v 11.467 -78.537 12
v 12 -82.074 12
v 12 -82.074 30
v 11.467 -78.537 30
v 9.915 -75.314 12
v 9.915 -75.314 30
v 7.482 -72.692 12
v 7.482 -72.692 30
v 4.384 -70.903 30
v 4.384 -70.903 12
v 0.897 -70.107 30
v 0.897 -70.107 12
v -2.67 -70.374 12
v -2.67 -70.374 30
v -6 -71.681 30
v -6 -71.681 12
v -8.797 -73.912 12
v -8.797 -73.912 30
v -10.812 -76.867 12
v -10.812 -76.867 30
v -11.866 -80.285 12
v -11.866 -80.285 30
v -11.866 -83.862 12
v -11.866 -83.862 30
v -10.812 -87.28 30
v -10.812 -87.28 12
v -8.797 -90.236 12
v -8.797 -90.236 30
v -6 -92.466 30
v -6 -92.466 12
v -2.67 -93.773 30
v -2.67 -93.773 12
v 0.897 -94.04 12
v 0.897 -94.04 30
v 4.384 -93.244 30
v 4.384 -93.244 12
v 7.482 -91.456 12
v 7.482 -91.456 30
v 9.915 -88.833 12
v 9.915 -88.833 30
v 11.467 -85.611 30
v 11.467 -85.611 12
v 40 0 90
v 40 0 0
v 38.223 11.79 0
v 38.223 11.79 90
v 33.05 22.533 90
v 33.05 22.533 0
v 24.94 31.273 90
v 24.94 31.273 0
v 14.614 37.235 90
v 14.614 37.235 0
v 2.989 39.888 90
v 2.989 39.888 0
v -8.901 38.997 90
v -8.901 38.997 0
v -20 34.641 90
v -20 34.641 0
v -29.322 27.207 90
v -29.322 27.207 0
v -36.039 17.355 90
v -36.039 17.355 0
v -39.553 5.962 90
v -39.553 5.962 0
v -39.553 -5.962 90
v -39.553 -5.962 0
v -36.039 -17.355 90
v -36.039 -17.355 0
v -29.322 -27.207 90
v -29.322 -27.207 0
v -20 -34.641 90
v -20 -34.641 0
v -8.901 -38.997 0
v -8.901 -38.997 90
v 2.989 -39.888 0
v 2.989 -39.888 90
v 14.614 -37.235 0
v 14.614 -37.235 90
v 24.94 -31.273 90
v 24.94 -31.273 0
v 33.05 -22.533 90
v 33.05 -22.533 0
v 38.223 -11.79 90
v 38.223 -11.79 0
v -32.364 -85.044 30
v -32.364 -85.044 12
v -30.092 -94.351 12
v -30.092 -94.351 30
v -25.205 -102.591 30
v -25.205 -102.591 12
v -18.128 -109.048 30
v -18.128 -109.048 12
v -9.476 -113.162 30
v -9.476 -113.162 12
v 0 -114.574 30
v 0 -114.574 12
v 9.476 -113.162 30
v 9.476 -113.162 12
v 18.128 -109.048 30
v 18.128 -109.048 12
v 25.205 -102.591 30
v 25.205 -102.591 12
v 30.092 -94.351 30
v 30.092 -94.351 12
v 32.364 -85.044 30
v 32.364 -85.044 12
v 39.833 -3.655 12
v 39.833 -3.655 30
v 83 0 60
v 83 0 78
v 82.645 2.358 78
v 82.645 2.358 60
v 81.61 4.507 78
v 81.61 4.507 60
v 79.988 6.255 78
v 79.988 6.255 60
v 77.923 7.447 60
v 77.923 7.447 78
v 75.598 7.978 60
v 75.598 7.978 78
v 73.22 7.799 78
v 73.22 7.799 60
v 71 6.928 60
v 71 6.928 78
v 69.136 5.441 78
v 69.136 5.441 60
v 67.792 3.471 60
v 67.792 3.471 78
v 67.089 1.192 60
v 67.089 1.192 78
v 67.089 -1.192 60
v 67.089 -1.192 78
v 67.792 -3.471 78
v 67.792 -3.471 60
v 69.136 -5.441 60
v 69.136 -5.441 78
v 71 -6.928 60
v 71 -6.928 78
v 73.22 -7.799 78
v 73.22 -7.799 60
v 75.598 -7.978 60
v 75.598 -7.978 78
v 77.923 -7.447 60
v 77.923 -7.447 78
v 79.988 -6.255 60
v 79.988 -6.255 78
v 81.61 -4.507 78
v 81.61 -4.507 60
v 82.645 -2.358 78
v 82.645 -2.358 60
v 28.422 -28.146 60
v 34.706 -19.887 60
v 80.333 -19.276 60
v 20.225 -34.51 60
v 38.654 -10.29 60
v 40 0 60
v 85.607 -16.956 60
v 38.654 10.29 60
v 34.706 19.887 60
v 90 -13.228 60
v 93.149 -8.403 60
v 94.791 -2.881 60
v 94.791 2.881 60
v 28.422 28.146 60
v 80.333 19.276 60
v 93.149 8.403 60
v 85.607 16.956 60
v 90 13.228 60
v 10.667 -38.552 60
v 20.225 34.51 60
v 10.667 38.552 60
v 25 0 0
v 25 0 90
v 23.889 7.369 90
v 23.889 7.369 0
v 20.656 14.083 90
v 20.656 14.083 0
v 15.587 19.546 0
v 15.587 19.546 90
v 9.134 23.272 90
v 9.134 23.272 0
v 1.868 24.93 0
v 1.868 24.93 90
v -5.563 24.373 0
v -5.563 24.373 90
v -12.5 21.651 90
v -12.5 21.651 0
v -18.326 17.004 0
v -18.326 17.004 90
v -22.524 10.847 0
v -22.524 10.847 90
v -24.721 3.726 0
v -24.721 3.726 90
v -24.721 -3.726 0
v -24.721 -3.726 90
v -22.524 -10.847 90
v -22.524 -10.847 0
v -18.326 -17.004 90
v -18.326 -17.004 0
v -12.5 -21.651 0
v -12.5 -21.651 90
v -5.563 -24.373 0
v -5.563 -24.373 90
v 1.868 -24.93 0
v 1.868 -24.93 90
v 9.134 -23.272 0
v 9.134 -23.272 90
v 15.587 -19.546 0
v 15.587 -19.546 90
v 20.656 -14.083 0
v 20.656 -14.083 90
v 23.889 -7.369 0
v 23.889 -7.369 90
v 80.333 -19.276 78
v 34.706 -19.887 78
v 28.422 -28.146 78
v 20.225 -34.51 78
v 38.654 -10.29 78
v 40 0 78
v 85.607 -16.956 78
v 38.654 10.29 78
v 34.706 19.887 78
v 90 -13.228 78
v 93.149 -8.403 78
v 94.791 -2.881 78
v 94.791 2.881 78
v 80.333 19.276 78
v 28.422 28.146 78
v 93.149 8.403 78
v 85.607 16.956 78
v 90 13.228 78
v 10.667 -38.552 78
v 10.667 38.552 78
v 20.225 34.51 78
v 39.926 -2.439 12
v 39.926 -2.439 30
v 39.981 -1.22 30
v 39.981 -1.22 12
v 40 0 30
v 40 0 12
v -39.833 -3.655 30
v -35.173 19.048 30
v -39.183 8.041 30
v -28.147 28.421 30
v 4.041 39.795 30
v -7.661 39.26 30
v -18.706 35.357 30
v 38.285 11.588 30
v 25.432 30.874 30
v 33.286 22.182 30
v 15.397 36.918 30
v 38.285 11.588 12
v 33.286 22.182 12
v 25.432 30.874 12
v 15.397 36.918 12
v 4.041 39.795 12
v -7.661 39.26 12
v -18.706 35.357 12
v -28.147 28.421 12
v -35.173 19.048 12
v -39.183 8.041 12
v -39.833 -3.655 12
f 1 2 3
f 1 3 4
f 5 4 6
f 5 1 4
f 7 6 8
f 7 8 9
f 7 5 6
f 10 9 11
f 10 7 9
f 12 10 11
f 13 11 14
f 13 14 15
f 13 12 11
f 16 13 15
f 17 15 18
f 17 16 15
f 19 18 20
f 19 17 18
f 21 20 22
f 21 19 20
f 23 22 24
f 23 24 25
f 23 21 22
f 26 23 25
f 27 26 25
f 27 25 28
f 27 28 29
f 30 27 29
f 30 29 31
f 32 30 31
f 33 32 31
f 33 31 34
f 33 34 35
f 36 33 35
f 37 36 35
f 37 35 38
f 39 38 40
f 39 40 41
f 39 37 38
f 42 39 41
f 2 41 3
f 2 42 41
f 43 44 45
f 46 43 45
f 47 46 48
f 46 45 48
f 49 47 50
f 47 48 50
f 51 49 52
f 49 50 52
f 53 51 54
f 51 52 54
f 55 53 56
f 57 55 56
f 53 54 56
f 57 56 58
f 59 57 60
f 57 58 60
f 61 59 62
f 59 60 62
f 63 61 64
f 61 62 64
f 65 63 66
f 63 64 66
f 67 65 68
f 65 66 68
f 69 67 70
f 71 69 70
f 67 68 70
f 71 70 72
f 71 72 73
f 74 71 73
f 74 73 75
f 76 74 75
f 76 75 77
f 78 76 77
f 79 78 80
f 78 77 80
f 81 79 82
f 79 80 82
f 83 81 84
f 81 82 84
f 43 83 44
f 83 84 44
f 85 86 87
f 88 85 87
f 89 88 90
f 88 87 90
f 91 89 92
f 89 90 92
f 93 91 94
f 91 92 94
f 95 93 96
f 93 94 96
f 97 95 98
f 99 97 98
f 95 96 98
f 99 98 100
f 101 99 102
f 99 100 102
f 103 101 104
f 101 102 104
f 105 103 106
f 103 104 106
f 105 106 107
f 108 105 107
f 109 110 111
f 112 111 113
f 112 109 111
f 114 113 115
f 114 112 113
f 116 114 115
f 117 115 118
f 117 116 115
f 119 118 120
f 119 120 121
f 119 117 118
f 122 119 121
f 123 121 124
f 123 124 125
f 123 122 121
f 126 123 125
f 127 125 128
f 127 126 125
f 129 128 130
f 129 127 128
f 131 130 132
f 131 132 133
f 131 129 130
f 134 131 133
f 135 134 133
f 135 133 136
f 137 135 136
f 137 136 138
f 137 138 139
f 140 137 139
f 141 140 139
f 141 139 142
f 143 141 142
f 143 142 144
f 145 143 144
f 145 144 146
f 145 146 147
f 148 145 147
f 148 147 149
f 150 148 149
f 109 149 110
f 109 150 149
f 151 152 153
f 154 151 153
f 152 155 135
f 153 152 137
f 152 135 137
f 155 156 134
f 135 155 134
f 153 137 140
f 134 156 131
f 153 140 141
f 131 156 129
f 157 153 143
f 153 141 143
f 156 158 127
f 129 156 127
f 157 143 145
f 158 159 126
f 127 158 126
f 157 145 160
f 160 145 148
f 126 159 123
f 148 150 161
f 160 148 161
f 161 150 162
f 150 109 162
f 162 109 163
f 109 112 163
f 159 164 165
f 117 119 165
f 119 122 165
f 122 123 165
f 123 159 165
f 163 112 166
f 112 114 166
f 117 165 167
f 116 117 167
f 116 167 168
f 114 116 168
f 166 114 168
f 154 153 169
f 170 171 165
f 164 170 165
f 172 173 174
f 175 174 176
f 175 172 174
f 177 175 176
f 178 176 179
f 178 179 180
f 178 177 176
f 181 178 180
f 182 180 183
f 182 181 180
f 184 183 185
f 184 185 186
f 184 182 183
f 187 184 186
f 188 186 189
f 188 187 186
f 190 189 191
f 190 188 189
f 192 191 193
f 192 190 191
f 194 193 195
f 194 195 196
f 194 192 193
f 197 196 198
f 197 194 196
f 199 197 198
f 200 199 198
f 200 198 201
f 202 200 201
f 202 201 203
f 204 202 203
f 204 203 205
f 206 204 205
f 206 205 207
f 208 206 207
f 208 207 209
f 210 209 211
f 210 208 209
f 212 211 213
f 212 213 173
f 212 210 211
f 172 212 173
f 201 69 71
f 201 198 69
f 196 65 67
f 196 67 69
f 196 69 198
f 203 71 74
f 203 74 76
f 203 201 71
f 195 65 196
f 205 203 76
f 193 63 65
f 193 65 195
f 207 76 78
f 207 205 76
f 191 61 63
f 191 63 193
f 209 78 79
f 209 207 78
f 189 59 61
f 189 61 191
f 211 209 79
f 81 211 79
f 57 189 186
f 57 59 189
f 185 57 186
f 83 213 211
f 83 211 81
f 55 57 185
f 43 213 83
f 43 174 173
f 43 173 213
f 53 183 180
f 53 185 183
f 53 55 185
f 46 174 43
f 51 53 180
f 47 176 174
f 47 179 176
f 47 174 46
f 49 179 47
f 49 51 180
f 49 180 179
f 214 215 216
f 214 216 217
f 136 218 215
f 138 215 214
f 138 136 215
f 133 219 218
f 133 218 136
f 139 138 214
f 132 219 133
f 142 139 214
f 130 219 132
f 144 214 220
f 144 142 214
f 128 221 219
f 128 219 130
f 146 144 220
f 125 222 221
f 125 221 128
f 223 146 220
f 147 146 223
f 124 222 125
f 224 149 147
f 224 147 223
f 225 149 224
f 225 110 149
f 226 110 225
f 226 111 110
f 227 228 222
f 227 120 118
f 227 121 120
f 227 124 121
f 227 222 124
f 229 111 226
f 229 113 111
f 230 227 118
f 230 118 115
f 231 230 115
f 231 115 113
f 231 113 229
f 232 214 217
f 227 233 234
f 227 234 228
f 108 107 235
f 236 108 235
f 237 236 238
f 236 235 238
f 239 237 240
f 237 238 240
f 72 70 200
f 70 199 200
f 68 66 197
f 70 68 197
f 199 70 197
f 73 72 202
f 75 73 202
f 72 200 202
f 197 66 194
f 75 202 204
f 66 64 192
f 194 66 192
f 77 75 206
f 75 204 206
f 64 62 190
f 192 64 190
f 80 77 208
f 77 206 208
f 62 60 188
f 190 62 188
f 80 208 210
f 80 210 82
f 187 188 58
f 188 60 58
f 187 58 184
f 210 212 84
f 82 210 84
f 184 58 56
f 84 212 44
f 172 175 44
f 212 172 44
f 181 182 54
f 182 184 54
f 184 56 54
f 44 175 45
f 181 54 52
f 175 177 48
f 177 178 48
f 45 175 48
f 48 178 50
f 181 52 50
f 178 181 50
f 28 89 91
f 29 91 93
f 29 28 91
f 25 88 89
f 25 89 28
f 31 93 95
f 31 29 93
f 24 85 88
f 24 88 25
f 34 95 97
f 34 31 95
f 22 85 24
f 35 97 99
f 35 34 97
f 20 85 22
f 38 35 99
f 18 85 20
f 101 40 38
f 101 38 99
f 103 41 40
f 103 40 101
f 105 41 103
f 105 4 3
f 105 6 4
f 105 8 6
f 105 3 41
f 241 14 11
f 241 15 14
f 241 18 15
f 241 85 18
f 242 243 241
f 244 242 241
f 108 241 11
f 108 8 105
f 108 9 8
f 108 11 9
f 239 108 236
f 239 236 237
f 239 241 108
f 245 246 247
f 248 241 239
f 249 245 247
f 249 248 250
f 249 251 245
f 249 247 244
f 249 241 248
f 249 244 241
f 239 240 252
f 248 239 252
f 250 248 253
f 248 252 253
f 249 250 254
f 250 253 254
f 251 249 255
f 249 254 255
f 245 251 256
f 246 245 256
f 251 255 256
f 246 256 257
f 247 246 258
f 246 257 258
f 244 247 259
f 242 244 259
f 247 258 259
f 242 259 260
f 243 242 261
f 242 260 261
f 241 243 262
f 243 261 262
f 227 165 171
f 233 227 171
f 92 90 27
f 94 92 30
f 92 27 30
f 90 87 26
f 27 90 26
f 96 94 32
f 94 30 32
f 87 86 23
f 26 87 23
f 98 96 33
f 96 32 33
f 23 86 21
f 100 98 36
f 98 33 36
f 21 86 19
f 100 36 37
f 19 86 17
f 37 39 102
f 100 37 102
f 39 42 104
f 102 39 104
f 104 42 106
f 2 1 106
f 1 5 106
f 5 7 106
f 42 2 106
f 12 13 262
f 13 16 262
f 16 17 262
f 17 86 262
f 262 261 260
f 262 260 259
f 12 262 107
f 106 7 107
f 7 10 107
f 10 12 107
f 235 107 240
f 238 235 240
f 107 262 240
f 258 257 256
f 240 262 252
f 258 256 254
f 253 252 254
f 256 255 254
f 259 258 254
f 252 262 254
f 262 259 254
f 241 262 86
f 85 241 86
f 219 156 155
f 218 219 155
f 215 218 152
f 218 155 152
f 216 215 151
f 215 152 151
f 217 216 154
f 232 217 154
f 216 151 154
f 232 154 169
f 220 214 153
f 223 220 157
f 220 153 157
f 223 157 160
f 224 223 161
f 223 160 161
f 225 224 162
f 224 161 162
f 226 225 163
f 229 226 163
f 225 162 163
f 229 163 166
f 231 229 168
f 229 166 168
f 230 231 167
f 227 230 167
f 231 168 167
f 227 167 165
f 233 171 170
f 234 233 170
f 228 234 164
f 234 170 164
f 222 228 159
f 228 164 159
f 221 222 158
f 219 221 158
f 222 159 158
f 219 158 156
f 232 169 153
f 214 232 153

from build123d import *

# Parameters (mm, degrees)
F0_R     = 40
F0_R_2   = 25
F1_DEPTH = 90
F2_R     = 8
F3_DEPTH = 18
F5_R     = 12
F6_DEPTH = 18


with BuildPart() as f1:
    # F0 (on Top) → F1 (new body)
    with BuildSketch(Plane.XY):
        Circle(F0_R)
        Circle(F0_R_2, mode=Mode.SUBTRACT)
    extrude(amount=F1_DEPTH)


with BuildPart() as f3:
    # F2 (on Top) → F3 (new body)
    with BuildSketch(Plane.XY):
        with BuildLine():
            Line((10.666667, -38.551553), (80.333333, -19.275776))
            ThreePointArc((80.333333, -19.275776), (95, 0), (80.333333, 19.275776))
            Line((80.333333, 19.275776), (10.666667, 38.551553))
            ThreePointArc((10.666667, 38.551553), (31.832897, 24.221203), (40, 0))
            ThreePointArc((40, 0), (31.832897, -24.221203), (10.666667, -38.551553))
        make_face()
        with Locations((75, 0)):
            Circle(F2_R, mode=Mode.SUBTRACT)
    extrude(amount=F3_DEPTH)


with BuildPart() as f3_1:
    # F4: moved
    add(f3.part.moved(Location((0, 0, 60))))


with BuildPart() as f6:
    # F5 (on Top) → F6 (new body)
    with BuildSketch(Plane.XY):
        with BuildLine():
            ThreePointArc((39.832639, -3.655255), (39.958138, -1.829542), (40, 0))
            ThreePointArc((40, 0), (-1.829542, 39.958138), (-39.832639, -3.655255))
            ThreePointArc((-39.832639, -3.655255), (0, -40), (39.832639, -3.655255))
        make_face()
        with BuildLine():
            ThreePointArc((39.832639, -3.655255), (0, -40), (-39.832639, -3.655255))
            Line((-39.832639, -3.655255), (-32.364019, -85.043502))
            ThreePointArc((-32.364019, -85.043502), (0, -114.573607), (32.364019, -85.043502))
            Line((32.364019, -85.043502), (39.832639, -3.655255))
        make_face()
        with Locations((0, -82.073607)):
            Circle(F5_R, mode=Mode.SUBTRACT)
    extrude(amount=F6_DEPTH)


with BuildPart() as f6_1:
    # F7: moved
    add(f6.part.moved(Location((0, 0, 12))))


solid = Compound([f1.part, f3_1.part, f6_1.part])
